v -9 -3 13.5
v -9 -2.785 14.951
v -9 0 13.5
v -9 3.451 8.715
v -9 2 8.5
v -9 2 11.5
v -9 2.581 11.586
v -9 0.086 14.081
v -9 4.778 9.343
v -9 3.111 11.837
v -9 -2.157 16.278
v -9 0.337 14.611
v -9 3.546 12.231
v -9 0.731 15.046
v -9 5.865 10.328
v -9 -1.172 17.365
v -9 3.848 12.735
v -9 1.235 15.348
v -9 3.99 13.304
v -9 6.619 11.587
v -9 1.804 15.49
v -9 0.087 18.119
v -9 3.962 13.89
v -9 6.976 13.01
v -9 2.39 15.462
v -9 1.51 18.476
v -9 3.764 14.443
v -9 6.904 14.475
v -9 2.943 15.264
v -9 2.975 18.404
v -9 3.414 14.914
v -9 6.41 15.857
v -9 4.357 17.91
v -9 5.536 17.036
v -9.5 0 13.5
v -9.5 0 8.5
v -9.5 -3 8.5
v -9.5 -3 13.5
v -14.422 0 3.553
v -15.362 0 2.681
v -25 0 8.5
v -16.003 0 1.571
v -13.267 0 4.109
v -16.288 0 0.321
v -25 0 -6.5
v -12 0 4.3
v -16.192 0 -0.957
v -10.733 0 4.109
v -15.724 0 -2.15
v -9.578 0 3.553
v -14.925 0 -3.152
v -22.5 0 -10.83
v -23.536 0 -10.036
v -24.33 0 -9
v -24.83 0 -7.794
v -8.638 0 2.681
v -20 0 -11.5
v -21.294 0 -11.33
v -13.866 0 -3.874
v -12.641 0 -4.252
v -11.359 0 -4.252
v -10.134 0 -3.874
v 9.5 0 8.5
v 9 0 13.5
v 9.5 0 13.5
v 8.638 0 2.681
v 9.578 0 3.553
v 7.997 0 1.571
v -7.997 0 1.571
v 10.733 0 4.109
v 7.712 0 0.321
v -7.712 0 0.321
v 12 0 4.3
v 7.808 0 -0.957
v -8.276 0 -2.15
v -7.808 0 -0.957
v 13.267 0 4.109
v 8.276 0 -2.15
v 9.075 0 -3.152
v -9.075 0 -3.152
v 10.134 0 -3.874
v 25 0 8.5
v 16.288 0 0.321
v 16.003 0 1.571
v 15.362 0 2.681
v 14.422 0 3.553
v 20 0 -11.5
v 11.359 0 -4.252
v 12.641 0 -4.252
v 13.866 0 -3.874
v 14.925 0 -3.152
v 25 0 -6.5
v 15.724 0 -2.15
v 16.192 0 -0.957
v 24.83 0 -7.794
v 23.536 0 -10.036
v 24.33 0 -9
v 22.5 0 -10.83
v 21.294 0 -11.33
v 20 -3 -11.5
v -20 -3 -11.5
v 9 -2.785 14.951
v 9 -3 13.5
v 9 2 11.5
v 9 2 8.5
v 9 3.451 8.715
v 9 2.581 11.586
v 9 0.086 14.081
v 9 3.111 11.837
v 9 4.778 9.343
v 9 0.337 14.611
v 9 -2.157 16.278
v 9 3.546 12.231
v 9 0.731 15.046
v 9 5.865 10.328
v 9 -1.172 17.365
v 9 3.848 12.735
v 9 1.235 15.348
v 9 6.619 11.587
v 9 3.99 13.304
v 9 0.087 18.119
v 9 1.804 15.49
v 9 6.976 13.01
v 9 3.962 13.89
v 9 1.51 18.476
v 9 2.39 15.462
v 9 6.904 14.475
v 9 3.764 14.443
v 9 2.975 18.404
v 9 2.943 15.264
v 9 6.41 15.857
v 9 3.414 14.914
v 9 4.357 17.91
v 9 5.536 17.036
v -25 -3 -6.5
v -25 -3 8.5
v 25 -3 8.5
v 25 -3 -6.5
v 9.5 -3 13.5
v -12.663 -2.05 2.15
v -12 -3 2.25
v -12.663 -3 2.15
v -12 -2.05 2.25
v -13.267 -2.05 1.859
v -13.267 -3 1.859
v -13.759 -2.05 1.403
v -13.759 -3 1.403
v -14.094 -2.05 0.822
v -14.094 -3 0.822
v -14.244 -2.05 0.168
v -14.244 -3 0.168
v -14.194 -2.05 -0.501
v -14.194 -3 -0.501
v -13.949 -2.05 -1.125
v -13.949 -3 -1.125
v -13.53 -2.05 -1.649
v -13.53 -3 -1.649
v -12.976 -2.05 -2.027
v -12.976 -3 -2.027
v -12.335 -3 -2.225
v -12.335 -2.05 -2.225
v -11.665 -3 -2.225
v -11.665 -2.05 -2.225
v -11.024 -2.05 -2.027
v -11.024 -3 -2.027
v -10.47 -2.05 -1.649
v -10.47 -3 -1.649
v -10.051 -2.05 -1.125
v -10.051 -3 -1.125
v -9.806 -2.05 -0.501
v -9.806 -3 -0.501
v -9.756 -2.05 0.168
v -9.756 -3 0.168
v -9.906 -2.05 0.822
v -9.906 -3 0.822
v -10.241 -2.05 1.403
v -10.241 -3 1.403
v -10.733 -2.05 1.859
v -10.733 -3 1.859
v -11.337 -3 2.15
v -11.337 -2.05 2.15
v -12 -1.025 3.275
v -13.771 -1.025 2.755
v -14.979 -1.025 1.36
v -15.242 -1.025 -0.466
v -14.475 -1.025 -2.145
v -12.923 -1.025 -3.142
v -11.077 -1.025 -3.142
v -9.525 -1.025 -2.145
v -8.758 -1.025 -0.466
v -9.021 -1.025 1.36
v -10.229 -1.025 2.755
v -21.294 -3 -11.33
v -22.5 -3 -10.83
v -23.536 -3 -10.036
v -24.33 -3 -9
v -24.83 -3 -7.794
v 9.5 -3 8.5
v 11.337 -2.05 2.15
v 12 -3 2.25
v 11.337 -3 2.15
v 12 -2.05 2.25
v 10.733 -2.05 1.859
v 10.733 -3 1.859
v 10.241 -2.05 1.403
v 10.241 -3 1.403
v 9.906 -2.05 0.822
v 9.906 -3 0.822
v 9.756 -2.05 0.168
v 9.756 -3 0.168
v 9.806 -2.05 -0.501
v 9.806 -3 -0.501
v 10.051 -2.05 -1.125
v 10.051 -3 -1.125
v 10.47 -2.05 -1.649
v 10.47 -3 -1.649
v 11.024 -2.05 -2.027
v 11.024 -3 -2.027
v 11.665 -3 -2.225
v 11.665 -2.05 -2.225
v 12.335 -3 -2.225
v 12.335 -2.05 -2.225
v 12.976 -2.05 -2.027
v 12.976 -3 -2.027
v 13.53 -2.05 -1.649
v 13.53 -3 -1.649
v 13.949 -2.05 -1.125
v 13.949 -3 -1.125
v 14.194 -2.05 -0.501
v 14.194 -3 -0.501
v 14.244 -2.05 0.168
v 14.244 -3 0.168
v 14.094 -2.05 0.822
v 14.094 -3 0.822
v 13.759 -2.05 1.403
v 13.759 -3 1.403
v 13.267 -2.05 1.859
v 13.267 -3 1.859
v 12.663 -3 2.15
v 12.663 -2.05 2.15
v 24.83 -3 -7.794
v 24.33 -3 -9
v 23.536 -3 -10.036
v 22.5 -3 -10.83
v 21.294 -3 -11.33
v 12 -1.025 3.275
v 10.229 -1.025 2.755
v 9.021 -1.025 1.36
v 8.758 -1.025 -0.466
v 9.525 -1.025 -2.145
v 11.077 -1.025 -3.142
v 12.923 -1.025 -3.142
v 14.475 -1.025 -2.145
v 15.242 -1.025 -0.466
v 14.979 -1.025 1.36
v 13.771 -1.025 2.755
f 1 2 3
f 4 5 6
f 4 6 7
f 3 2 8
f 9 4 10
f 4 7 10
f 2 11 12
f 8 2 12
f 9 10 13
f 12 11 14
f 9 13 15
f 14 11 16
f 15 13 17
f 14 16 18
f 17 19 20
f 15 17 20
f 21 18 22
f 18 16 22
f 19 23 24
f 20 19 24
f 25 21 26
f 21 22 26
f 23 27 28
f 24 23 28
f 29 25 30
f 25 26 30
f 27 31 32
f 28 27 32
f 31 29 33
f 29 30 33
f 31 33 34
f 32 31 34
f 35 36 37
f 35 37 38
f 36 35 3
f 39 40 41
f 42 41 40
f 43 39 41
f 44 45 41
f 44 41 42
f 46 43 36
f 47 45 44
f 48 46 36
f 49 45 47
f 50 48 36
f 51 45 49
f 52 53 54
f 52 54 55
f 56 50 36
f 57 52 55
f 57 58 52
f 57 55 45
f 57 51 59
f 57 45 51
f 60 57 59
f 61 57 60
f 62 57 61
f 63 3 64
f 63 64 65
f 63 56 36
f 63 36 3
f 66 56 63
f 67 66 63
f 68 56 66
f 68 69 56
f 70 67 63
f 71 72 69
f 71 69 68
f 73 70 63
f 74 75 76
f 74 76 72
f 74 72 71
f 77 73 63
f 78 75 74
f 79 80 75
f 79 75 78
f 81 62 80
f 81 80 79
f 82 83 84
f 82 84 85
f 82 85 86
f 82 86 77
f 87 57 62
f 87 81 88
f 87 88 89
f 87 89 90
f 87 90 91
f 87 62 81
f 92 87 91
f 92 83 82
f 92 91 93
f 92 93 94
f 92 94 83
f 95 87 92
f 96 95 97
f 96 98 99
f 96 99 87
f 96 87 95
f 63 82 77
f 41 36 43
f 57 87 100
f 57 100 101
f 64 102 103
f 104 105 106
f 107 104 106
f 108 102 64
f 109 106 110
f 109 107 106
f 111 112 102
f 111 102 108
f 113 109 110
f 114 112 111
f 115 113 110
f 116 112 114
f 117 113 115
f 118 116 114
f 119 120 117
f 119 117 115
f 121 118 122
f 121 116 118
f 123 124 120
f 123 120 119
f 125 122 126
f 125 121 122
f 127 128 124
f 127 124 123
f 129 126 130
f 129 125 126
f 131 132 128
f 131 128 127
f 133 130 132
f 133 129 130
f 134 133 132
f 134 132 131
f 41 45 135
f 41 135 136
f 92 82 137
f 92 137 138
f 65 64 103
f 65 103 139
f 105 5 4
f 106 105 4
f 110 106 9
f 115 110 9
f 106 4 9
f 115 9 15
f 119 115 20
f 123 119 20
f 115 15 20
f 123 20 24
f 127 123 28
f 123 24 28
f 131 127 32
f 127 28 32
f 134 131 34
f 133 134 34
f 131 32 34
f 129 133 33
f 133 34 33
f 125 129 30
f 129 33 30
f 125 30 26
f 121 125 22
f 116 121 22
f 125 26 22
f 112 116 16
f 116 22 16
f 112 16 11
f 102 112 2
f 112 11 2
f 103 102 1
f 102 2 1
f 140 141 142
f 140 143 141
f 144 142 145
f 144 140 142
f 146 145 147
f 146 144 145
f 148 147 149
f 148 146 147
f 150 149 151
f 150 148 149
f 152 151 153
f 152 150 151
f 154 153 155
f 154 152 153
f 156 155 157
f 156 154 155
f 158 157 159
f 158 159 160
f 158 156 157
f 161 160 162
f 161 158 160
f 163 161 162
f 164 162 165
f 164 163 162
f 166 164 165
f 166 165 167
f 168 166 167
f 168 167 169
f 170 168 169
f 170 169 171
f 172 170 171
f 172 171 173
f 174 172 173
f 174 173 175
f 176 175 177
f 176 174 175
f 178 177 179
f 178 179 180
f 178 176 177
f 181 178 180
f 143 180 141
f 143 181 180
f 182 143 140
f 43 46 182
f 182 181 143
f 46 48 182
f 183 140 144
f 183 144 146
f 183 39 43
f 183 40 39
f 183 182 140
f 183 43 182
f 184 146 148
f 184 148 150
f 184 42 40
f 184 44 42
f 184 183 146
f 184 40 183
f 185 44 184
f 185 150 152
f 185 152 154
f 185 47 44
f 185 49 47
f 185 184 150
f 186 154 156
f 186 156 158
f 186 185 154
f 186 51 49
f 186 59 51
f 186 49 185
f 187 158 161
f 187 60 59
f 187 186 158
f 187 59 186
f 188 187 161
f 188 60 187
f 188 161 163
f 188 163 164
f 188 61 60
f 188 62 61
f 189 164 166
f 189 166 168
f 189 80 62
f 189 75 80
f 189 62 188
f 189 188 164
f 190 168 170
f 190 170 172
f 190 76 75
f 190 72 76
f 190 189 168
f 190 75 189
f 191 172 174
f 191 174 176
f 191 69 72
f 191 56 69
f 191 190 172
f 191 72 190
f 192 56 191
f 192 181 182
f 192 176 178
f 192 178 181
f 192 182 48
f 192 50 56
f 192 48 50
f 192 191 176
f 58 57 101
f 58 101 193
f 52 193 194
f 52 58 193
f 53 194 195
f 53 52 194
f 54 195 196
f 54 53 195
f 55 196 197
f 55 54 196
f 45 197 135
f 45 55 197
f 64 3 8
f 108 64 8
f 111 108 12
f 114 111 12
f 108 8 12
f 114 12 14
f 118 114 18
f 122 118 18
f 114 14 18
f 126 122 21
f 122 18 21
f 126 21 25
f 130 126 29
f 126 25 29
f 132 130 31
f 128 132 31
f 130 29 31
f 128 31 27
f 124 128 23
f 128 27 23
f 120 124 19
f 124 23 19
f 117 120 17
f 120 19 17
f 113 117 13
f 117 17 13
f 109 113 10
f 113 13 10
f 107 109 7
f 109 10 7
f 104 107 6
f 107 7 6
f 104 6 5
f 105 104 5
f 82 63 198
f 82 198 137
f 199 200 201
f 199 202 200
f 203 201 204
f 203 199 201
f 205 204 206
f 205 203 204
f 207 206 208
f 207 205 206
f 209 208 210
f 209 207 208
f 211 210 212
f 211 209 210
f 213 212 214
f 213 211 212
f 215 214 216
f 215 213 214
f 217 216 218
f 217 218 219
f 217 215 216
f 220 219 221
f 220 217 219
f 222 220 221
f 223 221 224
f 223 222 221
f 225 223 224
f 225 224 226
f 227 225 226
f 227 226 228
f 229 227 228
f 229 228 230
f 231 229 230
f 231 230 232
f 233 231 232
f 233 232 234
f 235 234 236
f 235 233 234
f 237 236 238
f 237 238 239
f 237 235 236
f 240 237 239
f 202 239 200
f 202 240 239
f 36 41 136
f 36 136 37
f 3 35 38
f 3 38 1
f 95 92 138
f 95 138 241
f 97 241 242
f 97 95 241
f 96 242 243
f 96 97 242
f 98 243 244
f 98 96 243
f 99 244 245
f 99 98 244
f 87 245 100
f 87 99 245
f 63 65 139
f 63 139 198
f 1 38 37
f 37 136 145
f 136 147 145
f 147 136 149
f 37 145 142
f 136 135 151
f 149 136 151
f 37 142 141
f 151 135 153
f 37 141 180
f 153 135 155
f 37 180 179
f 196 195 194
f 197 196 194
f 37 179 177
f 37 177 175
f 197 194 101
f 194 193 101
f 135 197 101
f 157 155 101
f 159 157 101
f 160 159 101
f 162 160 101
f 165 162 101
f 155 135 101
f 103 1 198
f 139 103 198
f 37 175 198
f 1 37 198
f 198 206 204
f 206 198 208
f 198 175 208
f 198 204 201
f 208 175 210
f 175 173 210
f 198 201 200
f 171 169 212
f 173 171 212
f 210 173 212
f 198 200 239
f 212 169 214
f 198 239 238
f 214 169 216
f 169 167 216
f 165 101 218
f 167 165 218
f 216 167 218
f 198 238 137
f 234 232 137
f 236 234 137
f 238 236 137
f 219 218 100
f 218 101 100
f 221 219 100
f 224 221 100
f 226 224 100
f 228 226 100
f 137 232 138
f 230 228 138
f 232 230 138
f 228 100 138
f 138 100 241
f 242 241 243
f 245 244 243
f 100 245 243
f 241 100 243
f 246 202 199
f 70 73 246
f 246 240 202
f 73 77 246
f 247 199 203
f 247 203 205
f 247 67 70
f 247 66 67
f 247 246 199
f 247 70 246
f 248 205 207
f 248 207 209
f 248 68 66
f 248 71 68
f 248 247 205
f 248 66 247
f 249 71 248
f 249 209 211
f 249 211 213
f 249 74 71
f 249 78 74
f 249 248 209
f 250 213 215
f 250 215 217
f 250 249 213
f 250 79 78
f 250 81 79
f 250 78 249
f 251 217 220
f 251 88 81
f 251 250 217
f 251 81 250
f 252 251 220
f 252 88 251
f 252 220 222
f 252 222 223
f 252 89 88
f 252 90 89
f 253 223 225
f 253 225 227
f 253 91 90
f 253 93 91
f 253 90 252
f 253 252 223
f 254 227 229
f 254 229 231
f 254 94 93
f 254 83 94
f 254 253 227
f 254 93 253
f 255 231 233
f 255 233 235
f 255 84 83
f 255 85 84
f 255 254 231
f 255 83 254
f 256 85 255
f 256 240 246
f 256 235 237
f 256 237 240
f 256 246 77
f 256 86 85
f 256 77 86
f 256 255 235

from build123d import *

# Parameters (mm, degrees)
SM_BASE_FLANGE_1_DEPTH   = 3
OTHER_START              = -9
OTHER_1_DEPTH            = 18
HOLE_WIZARD_2_AT_2_COUNT = 2
HOLE_WIZARD_2_AT_2_PITCH = 24


# Read off the part's stored shape, not the designer's step: 褶边1
# Sheet-metal steps are written as plain solids
with BuildPart() as part:
    # Sketch 1 → 基体-法兰1 (new body)
    with BuildSketch(Plane(origin=(0, 0, 0), x_dir=(1, 0, 0), z_dir=(0, 1, 0))):
        with BuildLine():
            Line((-9.5, -13.5), (9.5, -13.5))
            Line((9.5, -13.5), (9.5, -8.5))
            Line((9.5, -8.5), (25, -8.5))
            Line((25, -8.5), (25, 6.5))
            ThreePointArc((25, 6.5), (23.535533906, 10.035533906), (20, 11.5))
            Line((20, 11.5), (-20, 11.5))
            ThreePointArc((-20, 11.5), (-23.535533906, 10.035533906), (-25, 6.5))
            Line((-25, 6.5), (-25, -8.5))
            Line((-25, -8.5), (-9.5, -8.5))
            Line((-9.5, -8.5), (-9.5, -13.5))
        make_face()
    extrude(amount=-SM_BASE_FLANGE_1_DEPTH)

    # Other 1 outline → Other 1 (add)
    with BuildSketch(Plane.YZ.offset(OTHER_START)):
        with BuildLine():
            Line((2, 11.5), (2, 8.5))
            ThreePointArc((2, 8.5), (5.535533906, 17.035533906), (-3, 13.5))
            Line((-3, 13.5), (0, 13.5))
            ThreePointArc((0, 13.5), (3.414213562, 14.914213562), (2, 11.5))
        make_face()
    extrude(amount=OTHER_1_DEPTH)

    # 草图13 → 打孔尺寸(%根据十字)槽半沉头木螺钉的类型2 (revolve, cut)
    with BuildSketch(Plane(origin=(-12, 0, 0), x_dir=(0, 0, 1), z_dir=(1, 0, 0))):
        Polygon((0, 0), (0, 3), (2.25, 3), (2.25, 2.05), (4.3, 0), align=None)
    hole_wizard_2 = revolve(axis=Axis((-12, 6.35, 0), (0, -1, 0)), mode=Mode.SUBTRACT)

    # 打孔尺寸(%根据十字)槽半沉头木螺钉的类型2 at 2: 打孔尺寸(%根据十字)槽半沉头木螺钉的类型2 ×2
    with Locations(*[(i * HOLE_WIZARD_2_AT_2_PITCH, 0, 0) for i in range(1, HOLE_WIZARD_2_AT_2_COUNT)]):
        add(hole_wizard_2, mode=Mode.SUBTRACT)


solid = part.part
